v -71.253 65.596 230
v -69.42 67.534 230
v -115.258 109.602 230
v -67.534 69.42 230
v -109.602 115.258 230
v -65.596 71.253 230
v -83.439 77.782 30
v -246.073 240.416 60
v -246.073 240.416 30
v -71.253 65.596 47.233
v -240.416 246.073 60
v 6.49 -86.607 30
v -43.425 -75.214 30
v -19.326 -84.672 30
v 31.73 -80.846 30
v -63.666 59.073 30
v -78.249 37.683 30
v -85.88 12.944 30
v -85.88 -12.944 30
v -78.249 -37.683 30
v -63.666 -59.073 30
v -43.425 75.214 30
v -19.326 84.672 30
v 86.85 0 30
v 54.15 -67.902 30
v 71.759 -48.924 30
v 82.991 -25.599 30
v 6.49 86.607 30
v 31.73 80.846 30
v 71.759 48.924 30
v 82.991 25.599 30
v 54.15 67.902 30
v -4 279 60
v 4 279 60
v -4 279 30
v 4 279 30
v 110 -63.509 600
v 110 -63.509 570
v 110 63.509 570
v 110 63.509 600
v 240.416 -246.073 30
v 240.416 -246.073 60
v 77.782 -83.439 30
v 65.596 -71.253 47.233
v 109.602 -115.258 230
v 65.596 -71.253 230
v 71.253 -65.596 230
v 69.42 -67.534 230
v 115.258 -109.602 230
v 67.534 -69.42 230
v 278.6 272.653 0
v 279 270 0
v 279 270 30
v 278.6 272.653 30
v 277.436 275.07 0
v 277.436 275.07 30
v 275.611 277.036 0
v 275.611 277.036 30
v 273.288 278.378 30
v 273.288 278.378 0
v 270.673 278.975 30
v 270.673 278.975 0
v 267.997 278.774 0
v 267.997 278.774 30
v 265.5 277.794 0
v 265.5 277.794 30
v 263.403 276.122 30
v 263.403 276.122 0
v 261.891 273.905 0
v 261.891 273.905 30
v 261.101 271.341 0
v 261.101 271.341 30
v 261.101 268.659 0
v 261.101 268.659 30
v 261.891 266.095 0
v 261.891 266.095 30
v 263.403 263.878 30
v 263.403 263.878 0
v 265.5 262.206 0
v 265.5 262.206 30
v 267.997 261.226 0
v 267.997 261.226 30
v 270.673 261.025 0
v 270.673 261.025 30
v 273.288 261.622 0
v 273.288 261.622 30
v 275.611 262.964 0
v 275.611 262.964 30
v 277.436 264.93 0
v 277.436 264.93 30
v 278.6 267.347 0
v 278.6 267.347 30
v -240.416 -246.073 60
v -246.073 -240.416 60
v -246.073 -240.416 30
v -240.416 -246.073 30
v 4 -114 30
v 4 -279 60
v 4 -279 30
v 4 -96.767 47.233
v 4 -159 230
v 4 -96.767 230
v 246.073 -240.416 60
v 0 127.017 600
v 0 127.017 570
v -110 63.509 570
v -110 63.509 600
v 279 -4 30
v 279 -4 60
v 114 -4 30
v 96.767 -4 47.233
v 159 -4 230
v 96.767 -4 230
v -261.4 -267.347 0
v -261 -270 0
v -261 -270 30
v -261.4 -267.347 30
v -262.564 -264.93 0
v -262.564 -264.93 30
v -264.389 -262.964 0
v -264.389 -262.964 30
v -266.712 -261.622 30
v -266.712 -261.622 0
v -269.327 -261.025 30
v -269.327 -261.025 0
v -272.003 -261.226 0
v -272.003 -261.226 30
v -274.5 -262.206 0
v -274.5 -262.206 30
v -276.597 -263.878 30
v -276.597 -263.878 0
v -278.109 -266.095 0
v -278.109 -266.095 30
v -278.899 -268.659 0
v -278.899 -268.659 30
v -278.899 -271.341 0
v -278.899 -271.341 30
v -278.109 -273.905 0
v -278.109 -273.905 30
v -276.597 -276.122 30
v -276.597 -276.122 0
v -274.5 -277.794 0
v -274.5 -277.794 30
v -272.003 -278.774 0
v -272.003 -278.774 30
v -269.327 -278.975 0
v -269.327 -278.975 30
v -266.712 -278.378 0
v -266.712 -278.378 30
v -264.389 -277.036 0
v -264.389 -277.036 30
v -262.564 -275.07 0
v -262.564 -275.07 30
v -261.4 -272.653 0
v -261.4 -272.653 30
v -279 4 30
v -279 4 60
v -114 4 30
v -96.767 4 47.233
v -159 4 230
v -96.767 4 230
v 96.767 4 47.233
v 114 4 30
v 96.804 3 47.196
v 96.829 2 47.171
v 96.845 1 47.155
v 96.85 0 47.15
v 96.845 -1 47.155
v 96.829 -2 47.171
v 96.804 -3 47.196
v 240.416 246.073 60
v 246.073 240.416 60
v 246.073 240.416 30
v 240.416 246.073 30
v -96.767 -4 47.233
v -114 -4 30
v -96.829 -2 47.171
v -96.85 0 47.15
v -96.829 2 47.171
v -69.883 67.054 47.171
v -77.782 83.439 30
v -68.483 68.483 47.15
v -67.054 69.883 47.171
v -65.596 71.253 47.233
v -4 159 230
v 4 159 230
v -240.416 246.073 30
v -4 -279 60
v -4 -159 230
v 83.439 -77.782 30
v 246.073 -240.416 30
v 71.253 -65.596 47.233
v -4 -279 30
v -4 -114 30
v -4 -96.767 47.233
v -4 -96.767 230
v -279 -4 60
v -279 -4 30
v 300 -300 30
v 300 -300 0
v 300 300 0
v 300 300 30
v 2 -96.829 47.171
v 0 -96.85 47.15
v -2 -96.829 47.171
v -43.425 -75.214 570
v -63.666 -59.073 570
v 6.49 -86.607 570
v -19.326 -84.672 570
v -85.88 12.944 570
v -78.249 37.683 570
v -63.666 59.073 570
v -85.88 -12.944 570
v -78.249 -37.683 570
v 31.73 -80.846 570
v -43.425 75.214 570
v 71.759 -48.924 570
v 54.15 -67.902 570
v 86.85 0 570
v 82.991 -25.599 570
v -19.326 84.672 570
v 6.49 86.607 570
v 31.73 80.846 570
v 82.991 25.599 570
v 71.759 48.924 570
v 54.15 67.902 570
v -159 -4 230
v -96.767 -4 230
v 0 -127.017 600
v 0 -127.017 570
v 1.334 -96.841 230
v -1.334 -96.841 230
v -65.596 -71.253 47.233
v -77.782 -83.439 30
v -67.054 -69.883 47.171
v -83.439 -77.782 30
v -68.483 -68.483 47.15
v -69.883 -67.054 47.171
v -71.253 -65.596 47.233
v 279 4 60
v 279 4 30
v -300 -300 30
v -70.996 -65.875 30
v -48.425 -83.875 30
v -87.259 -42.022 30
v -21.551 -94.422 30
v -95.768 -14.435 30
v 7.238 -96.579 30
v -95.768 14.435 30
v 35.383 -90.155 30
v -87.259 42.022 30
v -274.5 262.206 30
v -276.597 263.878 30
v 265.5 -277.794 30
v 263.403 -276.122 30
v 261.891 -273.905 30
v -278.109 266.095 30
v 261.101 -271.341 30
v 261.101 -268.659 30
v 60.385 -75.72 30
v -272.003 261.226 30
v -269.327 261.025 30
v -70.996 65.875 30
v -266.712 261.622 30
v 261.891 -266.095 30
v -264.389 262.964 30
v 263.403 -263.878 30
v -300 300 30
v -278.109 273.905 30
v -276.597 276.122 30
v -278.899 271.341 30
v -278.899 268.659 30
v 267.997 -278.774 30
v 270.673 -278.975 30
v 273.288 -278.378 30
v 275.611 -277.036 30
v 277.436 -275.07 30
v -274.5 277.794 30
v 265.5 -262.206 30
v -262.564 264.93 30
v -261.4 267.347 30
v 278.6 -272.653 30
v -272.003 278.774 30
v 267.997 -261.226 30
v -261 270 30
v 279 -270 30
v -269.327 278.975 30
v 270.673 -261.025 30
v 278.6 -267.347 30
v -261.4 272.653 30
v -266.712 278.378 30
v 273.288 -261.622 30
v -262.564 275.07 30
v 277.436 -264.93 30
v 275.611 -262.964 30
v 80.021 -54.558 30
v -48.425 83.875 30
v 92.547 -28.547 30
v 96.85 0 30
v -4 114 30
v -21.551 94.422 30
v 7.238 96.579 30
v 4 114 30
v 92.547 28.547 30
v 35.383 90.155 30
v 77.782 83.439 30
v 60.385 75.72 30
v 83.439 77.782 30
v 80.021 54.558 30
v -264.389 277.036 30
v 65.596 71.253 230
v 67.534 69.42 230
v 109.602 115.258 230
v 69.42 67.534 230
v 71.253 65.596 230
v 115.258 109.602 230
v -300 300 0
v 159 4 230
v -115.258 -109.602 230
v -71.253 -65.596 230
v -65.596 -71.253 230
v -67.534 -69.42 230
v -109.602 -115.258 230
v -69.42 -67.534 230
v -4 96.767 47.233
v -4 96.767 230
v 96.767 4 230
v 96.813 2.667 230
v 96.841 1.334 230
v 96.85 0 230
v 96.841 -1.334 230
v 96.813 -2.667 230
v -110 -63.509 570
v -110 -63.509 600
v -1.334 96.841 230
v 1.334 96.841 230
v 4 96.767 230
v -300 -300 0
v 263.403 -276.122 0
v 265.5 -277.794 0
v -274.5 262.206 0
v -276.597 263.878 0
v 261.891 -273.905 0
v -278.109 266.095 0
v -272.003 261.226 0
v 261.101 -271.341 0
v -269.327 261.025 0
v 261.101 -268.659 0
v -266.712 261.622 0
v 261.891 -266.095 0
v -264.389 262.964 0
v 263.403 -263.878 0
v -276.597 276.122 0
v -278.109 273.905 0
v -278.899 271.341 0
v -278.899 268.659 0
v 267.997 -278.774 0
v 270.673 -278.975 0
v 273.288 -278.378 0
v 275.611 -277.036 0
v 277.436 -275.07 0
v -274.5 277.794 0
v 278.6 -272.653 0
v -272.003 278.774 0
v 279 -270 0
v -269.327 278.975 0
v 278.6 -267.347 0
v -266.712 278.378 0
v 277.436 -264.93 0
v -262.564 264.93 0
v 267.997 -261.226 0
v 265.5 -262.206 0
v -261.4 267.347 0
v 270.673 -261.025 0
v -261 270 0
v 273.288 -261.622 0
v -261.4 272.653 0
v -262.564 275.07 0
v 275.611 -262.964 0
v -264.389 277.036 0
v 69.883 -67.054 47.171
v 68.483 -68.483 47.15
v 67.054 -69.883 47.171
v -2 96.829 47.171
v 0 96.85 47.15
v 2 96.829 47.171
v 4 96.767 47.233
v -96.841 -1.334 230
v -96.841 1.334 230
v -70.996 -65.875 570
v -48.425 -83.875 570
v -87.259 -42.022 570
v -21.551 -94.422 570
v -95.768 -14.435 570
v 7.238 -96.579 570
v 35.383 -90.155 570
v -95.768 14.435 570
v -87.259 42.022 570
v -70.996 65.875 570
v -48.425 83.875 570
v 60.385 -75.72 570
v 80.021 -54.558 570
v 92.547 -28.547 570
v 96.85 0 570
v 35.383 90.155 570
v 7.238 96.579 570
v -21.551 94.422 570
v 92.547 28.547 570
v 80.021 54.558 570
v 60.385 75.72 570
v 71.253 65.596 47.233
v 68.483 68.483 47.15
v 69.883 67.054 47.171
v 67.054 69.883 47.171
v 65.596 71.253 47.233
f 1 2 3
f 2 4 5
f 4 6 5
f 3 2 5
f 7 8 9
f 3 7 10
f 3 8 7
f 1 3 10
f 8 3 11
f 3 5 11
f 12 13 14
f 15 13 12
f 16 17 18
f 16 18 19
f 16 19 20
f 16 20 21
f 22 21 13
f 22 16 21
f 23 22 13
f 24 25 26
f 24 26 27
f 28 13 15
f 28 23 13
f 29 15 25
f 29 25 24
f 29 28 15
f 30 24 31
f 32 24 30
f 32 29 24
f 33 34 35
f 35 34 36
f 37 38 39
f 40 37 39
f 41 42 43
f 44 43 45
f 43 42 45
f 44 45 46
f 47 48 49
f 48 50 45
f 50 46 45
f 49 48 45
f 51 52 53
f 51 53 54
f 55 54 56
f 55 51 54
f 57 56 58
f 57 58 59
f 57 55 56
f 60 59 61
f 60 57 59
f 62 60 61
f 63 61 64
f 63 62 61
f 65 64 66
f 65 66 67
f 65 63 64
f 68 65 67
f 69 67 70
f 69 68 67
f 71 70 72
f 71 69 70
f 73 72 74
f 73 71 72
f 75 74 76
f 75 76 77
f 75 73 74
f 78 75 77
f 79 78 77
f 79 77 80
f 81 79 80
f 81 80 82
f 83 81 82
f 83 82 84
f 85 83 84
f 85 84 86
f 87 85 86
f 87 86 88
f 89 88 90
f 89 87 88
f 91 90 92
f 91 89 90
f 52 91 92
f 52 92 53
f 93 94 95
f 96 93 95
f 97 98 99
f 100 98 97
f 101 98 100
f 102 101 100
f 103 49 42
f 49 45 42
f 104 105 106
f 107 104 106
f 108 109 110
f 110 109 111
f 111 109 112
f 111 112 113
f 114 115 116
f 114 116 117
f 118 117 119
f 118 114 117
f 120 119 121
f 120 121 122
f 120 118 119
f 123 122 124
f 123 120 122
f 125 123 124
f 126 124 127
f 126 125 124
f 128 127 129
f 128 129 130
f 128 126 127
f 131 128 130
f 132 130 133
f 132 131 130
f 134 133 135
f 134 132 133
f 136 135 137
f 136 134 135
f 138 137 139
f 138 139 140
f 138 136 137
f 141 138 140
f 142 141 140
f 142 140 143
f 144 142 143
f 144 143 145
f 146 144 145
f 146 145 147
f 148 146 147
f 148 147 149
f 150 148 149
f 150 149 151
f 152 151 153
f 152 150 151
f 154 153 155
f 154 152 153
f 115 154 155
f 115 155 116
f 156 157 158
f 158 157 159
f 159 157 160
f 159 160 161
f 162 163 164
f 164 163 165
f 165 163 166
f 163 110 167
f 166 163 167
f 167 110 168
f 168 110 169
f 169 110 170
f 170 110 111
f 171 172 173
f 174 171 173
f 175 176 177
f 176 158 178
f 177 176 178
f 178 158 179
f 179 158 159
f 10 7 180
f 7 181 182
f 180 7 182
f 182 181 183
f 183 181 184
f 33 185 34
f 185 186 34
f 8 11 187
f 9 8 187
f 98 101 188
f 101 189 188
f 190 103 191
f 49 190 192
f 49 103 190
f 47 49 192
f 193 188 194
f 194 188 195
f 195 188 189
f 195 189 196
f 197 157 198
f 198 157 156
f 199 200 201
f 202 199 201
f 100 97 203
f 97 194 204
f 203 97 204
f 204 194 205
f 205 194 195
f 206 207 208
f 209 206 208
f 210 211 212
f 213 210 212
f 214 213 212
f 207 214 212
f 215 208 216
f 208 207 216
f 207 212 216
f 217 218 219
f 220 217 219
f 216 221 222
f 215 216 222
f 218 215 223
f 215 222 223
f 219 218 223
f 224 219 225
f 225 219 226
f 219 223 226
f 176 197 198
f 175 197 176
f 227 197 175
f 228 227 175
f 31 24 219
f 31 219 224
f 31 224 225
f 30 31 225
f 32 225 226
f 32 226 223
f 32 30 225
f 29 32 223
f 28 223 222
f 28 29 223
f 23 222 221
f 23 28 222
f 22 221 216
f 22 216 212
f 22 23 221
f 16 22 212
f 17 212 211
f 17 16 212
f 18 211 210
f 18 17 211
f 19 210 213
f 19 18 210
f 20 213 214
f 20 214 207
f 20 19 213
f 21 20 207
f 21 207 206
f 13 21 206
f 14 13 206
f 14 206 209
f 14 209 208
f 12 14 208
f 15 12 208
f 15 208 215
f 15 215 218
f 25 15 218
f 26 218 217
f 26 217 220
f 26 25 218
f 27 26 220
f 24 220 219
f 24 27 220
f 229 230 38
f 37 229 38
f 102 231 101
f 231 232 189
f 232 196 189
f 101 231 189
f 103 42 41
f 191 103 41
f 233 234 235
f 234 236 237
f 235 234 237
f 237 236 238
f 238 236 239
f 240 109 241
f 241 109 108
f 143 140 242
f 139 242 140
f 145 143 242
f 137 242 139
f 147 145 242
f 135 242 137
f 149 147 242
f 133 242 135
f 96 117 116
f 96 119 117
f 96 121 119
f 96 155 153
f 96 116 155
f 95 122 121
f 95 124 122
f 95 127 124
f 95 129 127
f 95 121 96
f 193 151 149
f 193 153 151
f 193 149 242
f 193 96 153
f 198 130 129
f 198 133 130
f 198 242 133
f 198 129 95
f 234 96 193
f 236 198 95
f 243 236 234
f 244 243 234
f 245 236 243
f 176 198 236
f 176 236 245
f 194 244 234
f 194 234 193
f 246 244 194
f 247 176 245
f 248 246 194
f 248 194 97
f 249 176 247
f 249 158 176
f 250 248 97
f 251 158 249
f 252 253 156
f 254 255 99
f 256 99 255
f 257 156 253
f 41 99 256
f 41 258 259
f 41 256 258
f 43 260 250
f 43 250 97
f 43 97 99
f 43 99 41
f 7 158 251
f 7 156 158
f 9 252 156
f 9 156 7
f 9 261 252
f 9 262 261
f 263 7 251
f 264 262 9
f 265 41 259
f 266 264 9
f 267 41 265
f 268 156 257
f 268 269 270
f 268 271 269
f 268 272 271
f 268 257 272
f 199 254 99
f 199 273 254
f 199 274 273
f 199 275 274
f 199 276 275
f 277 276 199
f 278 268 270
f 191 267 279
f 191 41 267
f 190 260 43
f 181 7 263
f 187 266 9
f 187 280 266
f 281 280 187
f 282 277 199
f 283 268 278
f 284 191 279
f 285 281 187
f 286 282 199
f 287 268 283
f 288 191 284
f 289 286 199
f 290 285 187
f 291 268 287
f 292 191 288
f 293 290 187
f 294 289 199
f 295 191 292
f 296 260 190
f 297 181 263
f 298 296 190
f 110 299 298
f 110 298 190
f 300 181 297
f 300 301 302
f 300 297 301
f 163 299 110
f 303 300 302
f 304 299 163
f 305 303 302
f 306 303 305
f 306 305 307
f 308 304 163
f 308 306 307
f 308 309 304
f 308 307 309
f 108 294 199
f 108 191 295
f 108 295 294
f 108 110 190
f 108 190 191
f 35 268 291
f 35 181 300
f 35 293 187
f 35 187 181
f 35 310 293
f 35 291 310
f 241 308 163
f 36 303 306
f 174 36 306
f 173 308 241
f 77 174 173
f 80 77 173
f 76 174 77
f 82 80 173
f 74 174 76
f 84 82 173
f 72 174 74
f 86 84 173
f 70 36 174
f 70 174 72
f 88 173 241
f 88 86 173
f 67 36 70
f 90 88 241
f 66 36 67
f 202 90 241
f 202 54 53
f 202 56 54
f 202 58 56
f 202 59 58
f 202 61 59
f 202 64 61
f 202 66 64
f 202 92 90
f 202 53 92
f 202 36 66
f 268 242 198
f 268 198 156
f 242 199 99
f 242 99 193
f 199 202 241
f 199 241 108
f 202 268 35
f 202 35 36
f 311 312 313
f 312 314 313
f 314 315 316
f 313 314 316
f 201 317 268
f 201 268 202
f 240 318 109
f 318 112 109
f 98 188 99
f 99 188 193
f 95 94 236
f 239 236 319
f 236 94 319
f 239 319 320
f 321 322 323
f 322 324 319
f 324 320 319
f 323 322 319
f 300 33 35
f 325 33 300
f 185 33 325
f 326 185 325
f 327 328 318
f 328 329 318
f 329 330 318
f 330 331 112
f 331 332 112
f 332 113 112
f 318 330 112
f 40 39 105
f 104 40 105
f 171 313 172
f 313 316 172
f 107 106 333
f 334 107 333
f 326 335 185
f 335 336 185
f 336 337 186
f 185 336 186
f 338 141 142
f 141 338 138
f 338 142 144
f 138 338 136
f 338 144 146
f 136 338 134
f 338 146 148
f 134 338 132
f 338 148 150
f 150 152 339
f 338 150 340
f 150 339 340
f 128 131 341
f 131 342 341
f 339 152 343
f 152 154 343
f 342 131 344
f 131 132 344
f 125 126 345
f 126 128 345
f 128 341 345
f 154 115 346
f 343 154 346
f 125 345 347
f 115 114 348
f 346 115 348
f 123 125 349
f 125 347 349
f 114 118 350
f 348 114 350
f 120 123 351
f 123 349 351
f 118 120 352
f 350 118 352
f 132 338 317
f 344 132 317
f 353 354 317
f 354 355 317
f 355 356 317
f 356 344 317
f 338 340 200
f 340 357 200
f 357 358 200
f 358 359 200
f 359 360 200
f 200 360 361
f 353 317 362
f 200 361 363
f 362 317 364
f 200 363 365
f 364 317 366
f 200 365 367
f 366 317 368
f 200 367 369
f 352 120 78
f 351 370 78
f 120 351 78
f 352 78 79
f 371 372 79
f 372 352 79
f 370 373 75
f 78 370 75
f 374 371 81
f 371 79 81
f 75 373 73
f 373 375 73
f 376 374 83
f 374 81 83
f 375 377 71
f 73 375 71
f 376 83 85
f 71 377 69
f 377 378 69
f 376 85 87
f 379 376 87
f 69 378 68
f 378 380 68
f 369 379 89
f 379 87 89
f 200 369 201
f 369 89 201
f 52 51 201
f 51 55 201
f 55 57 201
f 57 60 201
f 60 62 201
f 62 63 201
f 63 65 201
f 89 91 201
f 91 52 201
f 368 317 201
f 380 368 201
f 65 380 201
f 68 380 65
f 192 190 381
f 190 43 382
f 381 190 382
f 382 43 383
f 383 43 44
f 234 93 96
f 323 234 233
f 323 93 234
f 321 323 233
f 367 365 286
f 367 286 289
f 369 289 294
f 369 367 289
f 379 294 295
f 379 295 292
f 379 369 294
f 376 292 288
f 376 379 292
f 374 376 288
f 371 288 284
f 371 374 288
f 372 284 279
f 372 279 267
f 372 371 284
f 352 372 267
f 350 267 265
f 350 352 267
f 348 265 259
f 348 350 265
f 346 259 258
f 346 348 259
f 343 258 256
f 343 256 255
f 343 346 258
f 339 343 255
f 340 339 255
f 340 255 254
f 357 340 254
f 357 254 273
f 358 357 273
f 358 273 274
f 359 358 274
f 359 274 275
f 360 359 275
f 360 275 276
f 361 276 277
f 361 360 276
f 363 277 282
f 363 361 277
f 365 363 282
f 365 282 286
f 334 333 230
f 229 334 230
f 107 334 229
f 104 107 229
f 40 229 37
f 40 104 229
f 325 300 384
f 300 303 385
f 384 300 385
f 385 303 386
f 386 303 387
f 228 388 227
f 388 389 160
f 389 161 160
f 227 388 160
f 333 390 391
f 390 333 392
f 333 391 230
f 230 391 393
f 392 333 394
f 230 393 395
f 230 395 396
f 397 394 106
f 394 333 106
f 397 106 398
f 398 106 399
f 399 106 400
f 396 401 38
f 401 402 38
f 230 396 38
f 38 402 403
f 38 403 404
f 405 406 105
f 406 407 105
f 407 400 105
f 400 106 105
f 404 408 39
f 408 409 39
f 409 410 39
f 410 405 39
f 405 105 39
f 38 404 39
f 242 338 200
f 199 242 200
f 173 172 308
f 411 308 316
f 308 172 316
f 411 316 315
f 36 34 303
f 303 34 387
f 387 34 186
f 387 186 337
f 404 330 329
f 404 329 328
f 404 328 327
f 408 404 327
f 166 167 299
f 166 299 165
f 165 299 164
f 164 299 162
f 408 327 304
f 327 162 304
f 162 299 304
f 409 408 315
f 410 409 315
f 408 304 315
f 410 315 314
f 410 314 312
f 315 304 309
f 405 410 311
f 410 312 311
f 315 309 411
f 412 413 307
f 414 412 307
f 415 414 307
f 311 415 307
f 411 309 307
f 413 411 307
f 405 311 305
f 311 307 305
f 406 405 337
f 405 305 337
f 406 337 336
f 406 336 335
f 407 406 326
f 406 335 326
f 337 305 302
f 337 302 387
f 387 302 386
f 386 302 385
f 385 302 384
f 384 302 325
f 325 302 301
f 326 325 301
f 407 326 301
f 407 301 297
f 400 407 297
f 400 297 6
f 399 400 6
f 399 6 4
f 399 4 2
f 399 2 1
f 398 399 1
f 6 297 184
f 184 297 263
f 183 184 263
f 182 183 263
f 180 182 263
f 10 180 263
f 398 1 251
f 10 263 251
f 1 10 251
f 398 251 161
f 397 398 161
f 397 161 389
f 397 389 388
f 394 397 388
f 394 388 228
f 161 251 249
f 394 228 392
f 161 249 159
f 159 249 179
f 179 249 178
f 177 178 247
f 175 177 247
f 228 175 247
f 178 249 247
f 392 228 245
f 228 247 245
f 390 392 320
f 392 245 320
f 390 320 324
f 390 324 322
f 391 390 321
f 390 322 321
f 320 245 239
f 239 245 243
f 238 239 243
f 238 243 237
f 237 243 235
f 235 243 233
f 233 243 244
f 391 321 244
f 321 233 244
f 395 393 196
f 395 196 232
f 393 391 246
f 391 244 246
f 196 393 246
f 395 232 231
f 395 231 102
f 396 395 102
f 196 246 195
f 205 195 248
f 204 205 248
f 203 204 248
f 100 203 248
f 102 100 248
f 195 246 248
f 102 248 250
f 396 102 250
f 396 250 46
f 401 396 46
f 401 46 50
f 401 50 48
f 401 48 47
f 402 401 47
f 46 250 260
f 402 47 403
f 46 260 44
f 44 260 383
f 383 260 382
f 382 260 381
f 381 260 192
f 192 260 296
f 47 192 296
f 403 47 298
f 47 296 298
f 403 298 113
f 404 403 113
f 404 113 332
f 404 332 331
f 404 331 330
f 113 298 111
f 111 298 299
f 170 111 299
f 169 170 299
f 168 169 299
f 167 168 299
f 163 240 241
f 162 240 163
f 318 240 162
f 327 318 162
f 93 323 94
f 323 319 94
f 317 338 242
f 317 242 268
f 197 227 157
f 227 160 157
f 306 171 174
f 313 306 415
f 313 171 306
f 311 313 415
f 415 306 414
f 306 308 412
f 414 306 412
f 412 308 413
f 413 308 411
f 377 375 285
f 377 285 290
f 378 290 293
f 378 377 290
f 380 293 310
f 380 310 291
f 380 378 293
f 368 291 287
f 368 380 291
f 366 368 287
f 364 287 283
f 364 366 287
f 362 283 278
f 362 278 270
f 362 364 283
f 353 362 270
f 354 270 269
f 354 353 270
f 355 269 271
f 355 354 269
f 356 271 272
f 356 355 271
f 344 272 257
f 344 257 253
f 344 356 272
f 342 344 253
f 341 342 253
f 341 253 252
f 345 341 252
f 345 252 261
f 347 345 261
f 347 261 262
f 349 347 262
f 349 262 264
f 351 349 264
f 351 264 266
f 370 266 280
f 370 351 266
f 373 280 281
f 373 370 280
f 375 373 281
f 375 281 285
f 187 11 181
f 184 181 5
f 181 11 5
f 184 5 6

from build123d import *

# Parameters (mm, degrees)
EXTRUDE004_DEPTH         = 30
SKETCH001_R              = 96.85
SKETCH001_R_2            = 86.85
EXTRUDE001_DEPTH         = 540
EXTRUDE002_DEPTH         = 4
ARRAY_COUNT              = 4
EXTRUDE003_DEPTH         = 4
ARRAY001_COUNT           = 4
ARRAY001_PLACEMENT_ANGLE = 45
SKETCH_W                 = 600
SKETCH_H                 = 600
SKETCH_R                 = 9
EXTRUDE_DEPTH            = 30


with BuildPart() as lastplatte:
    # Sketch004 (on Face51 of Fusion) → Extrude004 (new body)
    with BuildSketch(Plane.XY.offset(570)):
        Polygon((110, 63.50853), (0, 127.017059), (-110, 63.50853), (-110, -63.50853), (0, -127.017059), (110, -63.50853), align=None)
    extrude(amount=EXTRUDE004_DEPTH)


with BuildPart() as rohr:
    # Sketch001 (on Face10 of Extrude) → Extrude001 (new body)
    with BuildSketch(Plane.XY.offset(30)):
        Circle(SKETCH001_R)
        Circle(SKETCH001_R_2, mode=Mode.SUBTRACT)
    extrude(amount=EXTRUDE001_DEPTH)


with BuildPart() as steife7:
    # Sketch002 → Extrude002 (new body, symmetric)
    with BuildSketch(Plane.XZ):
        Polygon((114, 30), (94, 50), (94, 230), (159, 230), (279, 60), (279, 30), align=None)
    extrude(amount=EXTRUDE002_DEPTH, both=True)

    # Array: steife7 ×4 about axis
    array_axis = Axis((0, 0, 0), (0, 0, 1))


with BuildPart() as steife7_1:
    add(steife7.part)
    for i in range(1, ARRAY_COUNT):
        add(steife7.part.rotate(array_axis, i * 360 / ARRAY_COUNT))


with BuildPart() as steife8:
    # Sketch003 → Extrude003 (new body, symmetric)
    with BuildSketch(Plane.XZ):
        Polygon((114, 30), (94, 50), (94, 230), (159, 230), (344, 60), (344, 30), align=None)
    extrude(amount=EXTRUDE003_DEPTH, both=True)

    # Array001: steife8 ×4 about axis
    array001_axis = Axis((0, 0, 0), (0, 0, 1))


with BuildPart() as steife8_1:
    add(steife8.part)
    for i in range(1, ARRAY001_COUNT):
        add(steife8.part.rotate(array001_axis, i * 360 / ARRAY001_COUNT))


with BuildPart() as steife8_2:
    # Array001 placement: moved
    add(steife8_1.part.rotate(Axis((0, 0, 0), (0, 0, 1)), ARRAY001_PLACEMENT_ANGLE))


with BuildPart() as fusion001:
    # Sketch → Extrude (new body)
    with BuildSketch(Plane.XY):
        Rectangle(SKETCH_W, SKETCH_H)
        with Locations((270, -270)):
            Circle(SKETCH_R, mode=Mode.SUBTRACT)
        with Locations((-270, -270)):
            Circle(SKETCH_R, mode=Mode.SUBTRACT)
        with Locations((270, 270)):
            Circle(SKETCH_R, mode=Mode.SUBTRACT)
        with Locations((-270, 270)):
            Circle(SKETCH_R, mode=Mode.SUBTRACT)
    extrude(amount=EXTRUDE_DEPTH)

    # Fusion: union rohr, steife7, steife8
    add(rohr.part)
    add(steife7_1.part)
    add(steife8_2.part)

    # Fusion001: union lastplatte
    add(lastplatte.part)


solid = fusion001.part
